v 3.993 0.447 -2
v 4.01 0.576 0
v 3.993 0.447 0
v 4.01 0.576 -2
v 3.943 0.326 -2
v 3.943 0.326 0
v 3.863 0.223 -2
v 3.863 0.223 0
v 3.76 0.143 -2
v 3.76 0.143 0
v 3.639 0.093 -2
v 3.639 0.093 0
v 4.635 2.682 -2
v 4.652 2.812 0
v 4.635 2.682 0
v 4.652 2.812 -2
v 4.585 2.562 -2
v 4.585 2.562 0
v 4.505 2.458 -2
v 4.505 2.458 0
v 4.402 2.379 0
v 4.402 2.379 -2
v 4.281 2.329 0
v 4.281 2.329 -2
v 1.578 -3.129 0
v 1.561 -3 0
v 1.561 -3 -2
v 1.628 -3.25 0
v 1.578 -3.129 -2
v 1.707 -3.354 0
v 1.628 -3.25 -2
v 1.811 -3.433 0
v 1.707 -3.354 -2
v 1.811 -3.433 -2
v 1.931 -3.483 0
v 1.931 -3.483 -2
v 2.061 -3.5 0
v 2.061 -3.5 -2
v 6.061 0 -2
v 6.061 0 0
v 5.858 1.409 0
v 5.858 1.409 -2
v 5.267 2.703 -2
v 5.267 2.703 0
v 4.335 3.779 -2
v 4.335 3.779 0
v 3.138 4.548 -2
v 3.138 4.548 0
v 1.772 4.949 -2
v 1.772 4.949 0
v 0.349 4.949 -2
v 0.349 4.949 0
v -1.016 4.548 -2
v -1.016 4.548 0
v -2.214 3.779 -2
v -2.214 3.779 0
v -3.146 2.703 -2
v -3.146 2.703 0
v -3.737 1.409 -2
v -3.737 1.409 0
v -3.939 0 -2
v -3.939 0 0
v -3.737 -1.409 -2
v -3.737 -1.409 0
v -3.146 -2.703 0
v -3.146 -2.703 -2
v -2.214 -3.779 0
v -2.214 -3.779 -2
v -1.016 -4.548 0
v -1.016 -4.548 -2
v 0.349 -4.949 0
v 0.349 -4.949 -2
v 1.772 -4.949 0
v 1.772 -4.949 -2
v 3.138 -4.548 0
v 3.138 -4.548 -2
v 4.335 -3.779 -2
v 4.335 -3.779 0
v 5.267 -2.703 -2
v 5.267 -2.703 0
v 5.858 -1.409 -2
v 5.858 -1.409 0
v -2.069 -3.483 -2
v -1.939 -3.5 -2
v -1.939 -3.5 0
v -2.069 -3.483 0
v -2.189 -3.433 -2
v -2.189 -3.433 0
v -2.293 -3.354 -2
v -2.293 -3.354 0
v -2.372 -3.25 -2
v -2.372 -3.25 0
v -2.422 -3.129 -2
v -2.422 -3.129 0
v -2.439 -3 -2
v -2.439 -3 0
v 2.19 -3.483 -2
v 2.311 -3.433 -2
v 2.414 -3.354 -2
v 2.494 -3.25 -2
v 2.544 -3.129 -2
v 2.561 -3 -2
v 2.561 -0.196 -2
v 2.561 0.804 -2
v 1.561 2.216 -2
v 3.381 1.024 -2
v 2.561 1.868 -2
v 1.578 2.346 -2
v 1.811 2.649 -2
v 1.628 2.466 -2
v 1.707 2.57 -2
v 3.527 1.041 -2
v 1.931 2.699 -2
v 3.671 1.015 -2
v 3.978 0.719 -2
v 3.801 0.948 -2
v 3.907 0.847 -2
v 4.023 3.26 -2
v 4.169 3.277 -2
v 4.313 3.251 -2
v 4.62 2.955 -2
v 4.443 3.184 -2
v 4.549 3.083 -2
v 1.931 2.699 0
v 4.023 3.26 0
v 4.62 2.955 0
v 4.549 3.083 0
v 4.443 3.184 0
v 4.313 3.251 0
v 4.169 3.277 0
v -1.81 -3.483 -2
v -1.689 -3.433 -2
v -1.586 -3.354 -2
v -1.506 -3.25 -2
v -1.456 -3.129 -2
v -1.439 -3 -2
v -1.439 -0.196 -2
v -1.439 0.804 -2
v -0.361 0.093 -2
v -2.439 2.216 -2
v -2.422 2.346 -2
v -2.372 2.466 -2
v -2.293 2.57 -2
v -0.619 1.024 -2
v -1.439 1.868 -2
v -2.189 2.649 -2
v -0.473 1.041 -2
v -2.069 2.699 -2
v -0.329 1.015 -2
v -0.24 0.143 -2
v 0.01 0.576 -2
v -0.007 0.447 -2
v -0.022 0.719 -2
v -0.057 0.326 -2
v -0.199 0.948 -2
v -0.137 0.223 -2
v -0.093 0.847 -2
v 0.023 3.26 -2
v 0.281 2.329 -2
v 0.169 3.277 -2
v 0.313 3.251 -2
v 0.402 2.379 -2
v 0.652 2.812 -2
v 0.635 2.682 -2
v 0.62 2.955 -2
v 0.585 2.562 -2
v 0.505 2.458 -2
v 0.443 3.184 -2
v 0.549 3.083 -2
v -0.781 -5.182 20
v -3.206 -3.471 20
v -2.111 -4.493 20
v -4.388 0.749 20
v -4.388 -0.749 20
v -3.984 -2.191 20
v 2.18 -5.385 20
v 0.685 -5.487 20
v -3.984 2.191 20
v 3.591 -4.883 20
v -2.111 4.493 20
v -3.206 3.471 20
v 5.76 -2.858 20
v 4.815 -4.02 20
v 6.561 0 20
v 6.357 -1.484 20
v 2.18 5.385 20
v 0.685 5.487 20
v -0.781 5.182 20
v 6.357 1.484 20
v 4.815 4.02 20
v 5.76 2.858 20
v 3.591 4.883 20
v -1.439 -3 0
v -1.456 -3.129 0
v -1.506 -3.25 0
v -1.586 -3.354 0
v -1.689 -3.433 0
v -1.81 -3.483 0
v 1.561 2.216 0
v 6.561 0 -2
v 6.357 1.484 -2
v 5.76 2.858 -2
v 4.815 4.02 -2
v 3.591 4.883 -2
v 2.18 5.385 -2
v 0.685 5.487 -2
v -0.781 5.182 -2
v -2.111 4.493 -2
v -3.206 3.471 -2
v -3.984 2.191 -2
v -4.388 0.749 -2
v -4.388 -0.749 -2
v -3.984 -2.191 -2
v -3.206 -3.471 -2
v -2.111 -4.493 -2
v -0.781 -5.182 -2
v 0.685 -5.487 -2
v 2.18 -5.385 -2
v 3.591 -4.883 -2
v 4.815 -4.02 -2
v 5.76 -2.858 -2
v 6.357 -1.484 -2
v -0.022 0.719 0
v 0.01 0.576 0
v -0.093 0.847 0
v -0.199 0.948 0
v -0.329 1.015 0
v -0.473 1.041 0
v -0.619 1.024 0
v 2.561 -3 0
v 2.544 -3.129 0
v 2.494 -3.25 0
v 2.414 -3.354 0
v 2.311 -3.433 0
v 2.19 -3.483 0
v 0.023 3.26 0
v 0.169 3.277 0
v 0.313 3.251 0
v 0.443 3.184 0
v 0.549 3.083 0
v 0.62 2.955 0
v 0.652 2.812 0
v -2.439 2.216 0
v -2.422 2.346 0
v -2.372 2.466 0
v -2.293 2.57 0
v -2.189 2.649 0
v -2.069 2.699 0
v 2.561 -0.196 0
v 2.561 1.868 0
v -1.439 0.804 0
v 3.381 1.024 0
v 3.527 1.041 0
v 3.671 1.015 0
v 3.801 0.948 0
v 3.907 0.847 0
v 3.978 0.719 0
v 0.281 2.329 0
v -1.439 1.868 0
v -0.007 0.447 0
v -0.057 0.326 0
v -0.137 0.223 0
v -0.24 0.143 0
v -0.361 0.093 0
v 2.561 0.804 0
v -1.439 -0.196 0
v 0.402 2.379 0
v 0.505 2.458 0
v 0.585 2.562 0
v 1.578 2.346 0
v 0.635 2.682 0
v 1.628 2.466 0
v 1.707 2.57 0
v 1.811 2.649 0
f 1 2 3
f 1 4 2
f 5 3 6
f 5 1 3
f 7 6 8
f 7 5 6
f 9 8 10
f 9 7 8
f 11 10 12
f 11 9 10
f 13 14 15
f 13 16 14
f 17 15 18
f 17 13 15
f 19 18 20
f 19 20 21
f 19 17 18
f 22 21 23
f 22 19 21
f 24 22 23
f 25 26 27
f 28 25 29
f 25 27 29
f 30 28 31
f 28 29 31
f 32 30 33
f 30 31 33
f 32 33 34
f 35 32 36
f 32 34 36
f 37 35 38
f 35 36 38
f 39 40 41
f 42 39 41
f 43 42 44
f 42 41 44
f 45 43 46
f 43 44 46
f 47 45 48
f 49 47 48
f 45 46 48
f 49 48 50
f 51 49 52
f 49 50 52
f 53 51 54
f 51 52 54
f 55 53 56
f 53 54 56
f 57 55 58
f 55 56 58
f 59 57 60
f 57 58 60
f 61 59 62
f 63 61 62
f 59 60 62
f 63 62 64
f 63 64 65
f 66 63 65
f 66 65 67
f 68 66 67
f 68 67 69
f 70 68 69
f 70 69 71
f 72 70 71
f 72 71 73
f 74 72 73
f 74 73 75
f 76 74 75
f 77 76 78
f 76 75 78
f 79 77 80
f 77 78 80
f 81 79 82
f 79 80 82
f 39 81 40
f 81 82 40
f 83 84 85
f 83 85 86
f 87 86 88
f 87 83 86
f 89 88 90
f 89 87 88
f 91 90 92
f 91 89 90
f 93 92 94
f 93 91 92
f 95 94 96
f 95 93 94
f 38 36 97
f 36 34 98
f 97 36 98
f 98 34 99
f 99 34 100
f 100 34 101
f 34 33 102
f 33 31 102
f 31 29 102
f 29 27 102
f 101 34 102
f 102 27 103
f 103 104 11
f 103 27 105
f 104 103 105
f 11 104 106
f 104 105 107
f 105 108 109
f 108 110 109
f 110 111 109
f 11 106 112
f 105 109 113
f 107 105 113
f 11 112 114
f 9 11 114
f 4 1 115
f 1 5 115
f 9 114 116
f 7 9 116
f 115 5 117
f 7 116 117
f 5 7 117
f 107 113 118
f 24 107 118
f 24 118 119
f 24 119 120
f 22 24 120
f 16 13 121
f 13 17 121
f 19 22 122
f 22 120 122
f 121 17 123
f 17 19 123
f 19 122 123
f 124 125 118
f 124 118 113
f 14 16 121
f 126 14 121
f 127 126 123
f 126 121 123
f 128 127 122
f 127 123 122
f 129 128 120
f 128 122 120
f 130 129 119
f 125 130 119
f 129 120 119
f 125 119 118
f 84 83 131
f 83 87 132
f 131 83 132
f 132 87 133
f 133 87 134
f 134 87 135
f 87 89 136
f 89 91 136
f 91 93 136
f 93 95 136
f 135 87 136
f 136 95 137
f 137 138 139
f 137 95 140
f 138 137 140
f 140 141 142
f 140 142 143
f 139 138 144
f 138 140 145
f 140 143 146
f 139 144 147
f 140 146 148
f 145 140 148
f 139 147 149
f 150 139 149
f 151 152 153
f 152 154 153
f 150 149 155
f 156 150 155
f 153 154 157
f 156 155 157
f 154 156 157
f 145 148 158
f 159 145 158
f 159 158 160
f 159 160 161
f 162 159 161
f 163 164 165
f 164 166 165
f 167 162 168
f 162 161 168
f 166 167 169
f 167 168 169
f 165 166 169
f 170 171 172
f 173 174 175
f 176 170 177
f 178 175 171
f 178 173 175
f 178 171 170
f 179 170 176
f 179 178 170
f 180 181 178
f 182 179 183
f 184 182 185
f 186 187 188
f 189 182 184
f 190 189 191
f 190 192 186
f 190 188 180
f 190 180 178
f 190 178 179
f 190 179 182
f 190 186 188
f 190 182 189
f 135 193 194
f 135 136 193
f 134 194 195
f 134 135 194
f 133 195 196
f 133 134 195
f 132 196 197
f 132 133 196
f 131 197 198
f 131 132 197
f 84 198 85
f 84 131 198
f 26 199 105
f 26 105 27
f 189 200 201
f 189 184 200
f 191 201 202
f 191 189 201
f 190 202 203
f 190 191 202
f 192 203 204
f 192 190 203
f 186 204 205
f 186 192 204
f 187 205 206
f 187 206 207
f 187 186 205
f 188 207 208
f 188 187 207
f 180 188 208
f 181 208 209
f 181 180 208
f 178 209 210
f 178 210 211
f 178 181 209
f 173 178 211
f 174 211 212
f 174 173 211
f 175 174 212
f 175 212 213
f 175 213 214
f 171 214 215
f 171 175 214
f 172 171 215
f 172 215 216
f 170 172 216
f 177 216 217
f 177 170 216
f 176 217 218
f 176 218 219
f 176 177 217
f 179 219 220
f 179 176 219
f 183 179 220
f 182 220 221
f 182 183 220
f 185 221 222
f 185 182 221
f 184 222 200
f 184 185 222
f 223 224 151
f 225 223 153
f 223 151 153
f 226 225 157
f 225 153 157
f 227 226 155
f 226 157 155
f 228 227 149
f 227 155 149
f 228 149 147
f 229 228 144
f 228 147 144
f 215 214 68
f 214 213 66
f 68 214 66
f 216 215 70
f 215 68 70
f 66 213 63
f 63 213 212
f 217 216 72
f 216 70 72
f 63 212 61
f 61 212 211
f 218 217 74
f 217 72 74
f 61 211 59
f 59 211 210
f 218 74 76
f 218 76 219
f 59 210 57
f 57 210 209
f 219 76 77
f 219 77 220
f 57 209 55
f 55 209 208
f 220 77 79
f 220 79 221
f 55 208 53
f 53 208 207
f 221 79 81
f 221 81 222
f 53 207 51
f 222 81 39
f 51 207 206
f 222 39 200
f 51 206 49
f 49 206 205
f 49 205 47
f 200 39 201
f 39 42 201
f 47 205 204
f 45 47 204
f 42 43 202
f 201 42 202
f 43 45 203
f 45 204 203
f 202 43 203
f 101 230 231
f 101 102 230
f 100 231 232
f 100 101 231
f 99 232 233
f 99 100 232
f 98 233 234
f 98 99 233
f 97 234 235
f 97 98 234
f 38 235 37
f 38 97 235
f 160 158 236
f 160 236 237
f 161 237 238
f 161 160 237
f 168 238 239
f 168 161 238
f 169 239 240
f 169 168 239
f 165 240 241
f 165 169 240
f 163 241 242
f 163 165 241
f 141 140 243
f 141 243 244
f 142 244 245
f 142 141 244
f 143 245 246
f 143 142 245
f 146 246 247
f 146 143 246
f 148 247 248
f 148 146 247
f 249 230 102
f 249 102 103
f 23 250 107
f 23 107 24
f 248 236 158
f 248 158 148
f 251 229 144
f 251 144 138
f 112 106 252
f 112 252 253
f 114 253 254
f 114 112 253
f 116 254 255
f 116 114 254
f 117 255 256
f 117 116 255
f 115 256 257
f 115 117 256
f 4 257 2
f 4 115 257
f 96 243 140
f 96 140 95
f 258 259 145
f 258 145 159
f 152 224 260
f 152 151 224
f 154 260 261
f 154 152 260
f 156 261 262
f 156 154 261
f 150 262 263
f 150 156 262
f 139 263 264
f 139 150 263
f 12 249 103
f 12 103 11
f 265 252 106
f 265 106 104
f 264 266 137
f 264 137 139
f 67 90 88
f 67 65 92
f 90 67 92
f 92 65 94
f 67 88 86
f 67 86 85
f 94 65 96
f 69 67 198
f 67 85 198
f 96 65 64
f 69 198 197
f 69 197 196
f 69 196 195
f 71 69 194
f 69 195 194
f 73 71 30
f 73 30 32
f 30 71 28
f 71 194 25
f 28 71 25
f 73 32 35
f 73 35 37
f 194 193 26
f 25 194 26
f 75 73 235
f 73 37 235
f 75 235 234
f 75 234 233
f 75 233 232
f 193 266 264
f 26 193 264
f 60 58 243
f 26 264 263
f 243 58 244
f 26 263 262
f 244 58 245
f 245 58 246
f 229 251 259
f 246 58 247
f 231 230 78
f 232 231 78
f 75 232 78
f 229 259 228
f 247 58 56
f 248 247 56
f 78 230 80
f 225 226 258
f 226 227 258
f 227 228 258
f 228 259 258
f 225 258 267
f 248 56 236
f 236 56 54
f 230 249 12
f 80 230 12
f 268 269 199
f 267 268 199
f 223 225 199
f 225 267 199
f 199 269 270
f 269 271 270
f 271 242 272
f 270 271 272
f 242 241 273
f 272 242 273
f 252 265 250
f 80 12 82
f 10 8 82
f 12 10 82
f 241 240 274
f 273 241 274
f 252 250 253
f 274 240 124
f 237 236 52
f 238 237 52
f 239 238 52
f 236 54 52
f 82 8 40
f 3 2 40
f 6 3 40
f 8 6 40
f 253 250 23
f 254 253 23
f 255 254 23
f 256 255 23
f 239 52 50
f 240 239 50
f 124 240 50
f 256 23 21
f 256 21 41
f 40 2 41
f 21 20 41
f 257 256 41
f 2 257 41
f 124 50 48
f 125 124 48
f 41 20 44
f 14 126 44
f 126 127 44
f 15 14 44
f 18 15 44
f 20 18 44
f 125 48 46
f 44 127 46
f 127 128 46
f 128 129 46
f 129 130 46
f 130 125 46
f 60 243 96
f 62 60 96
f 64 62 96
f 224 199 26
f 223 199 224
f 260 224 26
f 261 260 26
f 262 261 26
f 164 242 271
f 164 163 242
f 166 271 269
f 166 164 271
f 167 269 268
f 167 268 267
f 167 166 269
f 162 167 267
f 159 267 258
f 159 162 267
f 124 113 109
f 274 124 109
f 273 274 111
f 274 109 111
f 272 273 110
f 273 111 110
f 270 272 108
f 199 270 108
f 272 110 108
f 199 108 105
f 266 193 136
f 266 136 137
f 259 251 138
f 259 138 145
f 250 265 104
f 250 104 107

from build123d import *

# Parameters (mm, degrees)
F0_R        = 5.5
F0_R_2      = 5
F1_DEPTH    = 20
F2_DEPTH    = 2
F3_R        = 0.5
F4_T1_DEPTH = 3.6258666345
F4_T3_DEPTH = 3.25
F4_T5_DEPTH = 2.959158735


# Not quite as in the source:
# - a fillet or chamfer that OpenCascade refuses, or shapes differently, is made with other operations: its cross-section is extruded or revolved along the edge and cut away or added
# - a feature names something its author has since deleted; it is built from what else it names


with BuildPart() as f1:
    # F0 (on Top) → F1 (new body)
    with BuildSketch(Plane.XY):
        with Locations((1.0606649963, 0)):
            Circle(F0_R)
        with Locations((1.0606649963, 0)):
            Circle(F0_R_2, mode=Mode.SUBTRACT)
        with Locations((1.0606649963, 0)):
            Circle(F0_R_2)
        Polygon((-1.4393350037, -3.5), (-2.4393350037, -3.5), (-2.4393350037, 2.6), (0.6516276405, 3.4282209443), (0.6516276405, 2.4282209443), (-1.4393350037, 1.8679491924), (-1.4393350037, 0.8042534147), (0.0095537358, 1.1924819824), (0.0095537358, 0.1924819824), (-1.4393350037, -0.1957465853), align=None, mode=Mode.SUBTRACT)
        Polygon((1.5606649963, -3.5), (1.5606649963, 2.6), (4.6516276405, 3.4282209443), (4.6516276405, 2.4282209443), (2.5606649963, 1.8679491924), (2.5606649963, 0.8042534147), (4.0095537358, 1.1924819824), (4.0095537358, 0.1924819824), (2.5606649963, -0.1957465853), (2.5606649963, -3.5), align=None, mode=Mode.SUBTRACT)
        Polygon((4.6516276405, 3.4282209443), (1.5606649963, 2.6), (1.5606649963, -3.5), (2.5606649963, -3.5), (2.5606649963, -0.1957465853), (4.0095537358, 0.1924819824), (4.0095537358, 1.1924819824), (2.5606649963, 0.8042534147), (2.5606649963, 1.8679491924), (4.6516276405, 2.4282209443), align=None)
        Polygon((-2.4393350037, 2.6), (-2.4393350037, -3.5), (-1.4393350037, -3.5), (-1.4393350037, -0.1957465853), (0.0095537358, 0.1924819824), (0.0095537358, 1.1924819824), (-1.4393350037, 0.8042534147), (-1.4393350037, 1.8679491924), (0.6516276405, 2.4282209443), (0.6516276405, 3.4282209443), align=None)
    extrude(amount=F1_DEPTH)

    # F0 (on Top) → F2 (join)
    with BuildSketch(Plane.XY):
        with Locations((1.0606649963, 0)):
            Circle(F0_R)
        with Locations((1.0606649963, 0)):
            Circle(F0_R_2, mode=Mode.SUBTRACT)
        Polygon((-2.4393350037, 2.6), (-2.4393350037, -3.5), (-1.4393350037, -3.5), (-1.4393350037, -0.1957465853), (0.0095537358, 0.1924819824), (0.0095537358, 1.1924819824), (-1.4393350037, 0.8042534147), (-1.4393350037, 1.8679491924), (0.6516276405, 2.4282209443), (0.6516276405, 3.4282209443), align=None)
        Polygon((4.6516276405, 3.4282209443), (1.5606649963, 2.6), (1.5606649963, -3.5), (2.5606649963, -3.5), (2.5606649963, -0.1957465853), (4.0095537358, 0.1924819824), (4.0095537358, 1.1924819824), (2.5606649963, 0.8042534147), (2.5606649963, 1.8679491924), (4.6516276405, 2.4282209443), align=None)
    extrude(amount=-F2_DEPTH)

    # F3
    f3_edges = [f1.edges().sort_by_distance(p)[0] for p in [
        (2.560665, -3.5, -1),
        (-1.439335, -3.5, -1),
        (4.009554, 0.192482, -1),
        (0.009554, 0.192482, -1),
        (4.651628, 2.428221, -1),
        (0.651628, 2.428221, -1),
    ]]
    fillet(f3_edges, radius=F3_R)

    # F4: fillet of radius 0.5 on 8 edges, made by hand

    # F4_s2 → F4_t1 (cut)
    with BuildSketch(Plane.XY.offset(-3.6258666345)):
        with BuildLine():
            ThreePointArc((4.6516276405, 2.8118844383), (4.4431733372, 3.1840141424), (4.0234410115, 3.2598988444))
            Line((4.0234410115, 3.2598988444), (4.6516276405, 3.4282209443))
            Line((4.6516276405, 3.4282209443), (4.6516276405, 2.8118844383))
        make_face()
        with BuildLine():
            ThreePointArc((0.0234410115, 3.2598988444), (0.4431733372, 3.1840141424), (0.6516276405, 2.8118844383))
            Line((0.6516276405, 2.8118844383), (0.6516276405, 3.4282209443))
            Line((0.6516276405, 3.4282209443), (0.0234410115, 3.2598988444))
        make_face()
        with BuildLine():
            ThreePointArc((0.0095537358, 0.5761454764), (-0.1989005675, 0.9482751804), (-0.6186328932, 1.0241598824))
            Line((-0.6186328932, 1.0241598824), (0.0095537358, 1.1924819824))
            Line((0.0095537358, 1.1924819824), (0.0095537358, 0.5761454764))
        make_face()
        with BuildLine():
            ThreePointArc((3.3813671068, 1.0241598824), (3.8010994325, 0.9482751804), (4.0095537358, 0.5761454764))
            Line((4.0095537358, 0.5761454764), (4.0095537358, 1.1924819824))
            Line((4.0095537358, 1.1924819824), (3.3813671068, 1.0241598824))
        make_face()
    extrude(amount=F4_T1_DEPTH, mode=Mode.SUBTRACT)

    # F4_s4 → F4_t3 (cut)
    with BuildSketch(Plane.XY.offset(-3.25)):
        with BuildLine():
            ThreePointArc((1.5606649963, -3), (1.7071116058, -3.3535533906), (2.0606649963, -3.5))
            Line((2.0606649963, -3.5), (1.5606649963, -3.5))
            Line((1.5606649963, -3.5), (1.5606649963, -3))
        make_face()
        with BuildLine():
            ThreePointArc((-1.9393350037, -3.5), (-2.2928883942, -3.3535533906), (-2.4393350037, -3))
            Line((-2.4393350037, -3), (-2.4393350037, -3.5))
            Line((-2.4393350037, -3.5), (-1.9393350037, -3.5))
        make_face()
    extrude(amount=F4_T3_DEPTH, mode=Mode.SUBTRACT)

    # F4_s6 → F4_t5 (cut)
    with BuildSketch(Plane.XY.offset(-2.959158735)):
        with BuildLine():
            ThreePointArc((1.9312554738, 2.6992994192), (1.6639883262, 2.5207172205), (1.5606649963, 2.216336506))
            Line((1.5606649963, 2.216336506), (1.5606649963, 2.6))
            Line((1.5606649963, 2.6), (1.9312554738, 2.6992994192))
        make_face()
        with BuildLine():
            ThreePointArc((-2.4393350037, 2.216336506), (-2.3360116738, 2.5207172205), (-2.0687445262, 2.6992994192))
            Line((-2.0687445262, 2.6992994192), (-2.4393350037, 2.6))
            Line((-2.4393350037, 2.6), (-2.4393350037, 2.216336506))
        make_face()
    extrude(amount=F4_T5_DEPTH, mode=Mode.SUBTRACT)


solid = f1.part
